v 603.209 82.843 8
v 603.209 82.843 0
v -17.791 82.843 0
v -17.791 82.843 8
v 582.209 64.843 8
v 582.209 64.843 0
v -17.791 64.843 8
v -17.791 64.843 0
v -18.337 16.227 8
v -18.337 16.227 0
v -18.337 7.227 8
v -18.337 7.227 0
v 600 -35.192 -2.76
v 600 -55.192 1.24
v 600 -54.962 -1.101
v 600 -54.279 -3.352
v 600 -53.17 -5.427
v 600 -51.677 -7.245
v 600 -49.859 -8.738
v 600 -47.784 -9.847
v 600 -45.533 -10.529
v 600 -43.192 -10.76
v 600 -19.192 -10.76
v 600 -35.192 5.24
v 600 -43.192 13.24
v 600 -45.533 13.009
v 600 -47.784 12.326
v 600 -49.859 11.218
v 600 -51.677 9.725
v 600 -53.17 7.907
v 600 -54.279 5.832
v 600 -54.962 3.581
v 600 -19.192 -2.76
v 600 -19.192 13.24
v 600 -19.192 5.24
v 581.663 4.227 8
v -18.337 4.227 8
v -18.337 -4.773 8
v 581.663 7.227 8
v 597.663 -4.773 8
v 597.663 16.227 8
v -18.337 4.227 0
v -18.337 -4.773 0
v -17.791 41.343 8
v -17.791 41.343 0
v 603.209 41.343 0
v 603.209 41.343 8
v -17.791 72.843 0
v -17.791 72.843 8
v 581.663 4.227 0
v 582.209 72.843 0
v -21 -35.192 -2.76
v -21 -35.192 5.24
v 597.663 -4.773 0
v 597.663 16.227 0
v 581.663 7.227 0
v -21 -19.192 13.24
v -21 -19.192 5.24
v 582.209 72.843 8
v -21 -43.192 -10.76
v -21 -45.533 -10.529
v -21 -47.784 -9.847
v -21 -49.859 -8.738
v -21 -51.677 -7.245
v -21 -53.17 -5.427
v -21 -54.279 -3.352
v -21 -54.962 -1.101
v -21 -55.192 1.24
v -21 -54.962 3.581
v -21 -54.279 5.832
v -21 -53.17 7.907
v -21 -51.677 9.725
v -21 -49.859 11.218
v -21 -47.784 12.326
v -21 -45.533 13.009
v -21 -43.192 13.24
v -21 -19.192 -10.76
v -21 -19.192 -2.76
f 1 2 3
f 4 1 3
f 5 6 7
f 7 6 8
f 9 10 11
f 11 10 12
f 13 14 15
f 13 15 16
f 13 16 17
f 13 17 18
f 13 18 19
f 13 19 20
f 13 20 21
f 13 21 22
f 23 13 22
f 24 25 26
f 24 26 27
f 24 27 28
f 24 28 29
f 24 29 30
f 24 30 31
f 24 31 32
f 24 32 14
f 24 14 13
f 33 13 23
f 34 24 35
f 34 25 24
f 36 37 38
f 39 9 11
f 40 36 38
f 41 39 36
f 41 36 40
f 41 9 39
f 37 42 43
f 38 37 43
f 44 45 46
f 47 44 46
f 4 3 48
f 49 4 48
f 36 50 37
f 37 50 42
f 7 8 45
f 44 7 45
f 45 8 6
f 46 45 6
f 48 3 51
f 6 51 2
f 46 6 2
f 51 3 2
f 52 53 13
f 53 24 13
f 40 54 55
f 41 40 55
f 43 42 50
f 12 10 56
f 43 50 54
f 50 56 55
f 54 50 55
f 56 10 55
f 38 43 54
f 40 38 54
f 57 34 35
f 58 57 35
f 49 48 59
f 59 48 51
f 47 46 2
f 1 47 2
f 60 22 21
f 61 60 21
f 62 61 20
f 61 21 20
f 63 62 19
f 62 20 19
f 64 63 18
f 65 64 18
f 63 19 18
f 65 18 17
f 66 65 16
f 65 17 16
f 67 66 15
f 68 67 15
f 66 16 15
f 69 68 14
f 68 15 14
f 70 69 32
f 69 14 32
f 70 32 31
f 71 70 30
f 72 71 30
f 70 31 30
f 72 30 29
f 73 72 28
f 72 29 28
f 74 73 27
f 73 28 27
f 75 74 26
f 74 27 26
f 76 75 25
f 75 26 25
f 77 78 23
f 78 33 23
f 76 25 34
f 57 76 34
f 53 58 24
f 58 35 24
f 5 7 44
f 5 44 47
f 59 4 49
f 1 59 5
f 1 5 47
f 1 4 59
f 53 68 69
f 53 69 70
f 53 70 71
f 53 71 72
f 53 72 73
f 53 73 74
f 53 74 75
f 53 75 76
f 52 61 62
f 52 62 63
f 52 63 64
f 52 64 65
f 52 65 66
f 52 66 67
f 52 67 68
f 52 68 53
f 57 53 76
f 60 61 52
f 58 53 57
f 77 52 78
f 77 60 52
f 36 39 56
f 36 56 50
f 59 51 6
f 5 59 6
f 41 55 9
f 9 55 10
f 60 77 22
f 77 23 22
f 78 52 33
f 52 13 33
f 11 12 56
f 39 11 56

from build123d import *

# Parameters (mm, degrees)
F2_DEPTH = 8
F3_DEPTH = 8
F5_DEPTH = 600
F6_DEPTH = 21


with BuildPart() as f2:
    # F0 (on Top) → F2 (new body)
    with BuildSketch(Plane.XY):
        Polygon((581.663213, 16.226503), (-18.336787, 16.226503), (-18.336787, 7.226503), (581.663213, 7.226503), (581.663213, 4.226503), (-18.336787, 4.226503), (-18.336787, -4.773497), (581.663213, -4.773497), (597.663213, -4.773497), (597.663213, 16.226503), align=None)
    extrude(amount=F2_DEPTH)


with BuildPart() as f3:
    # F1 (on Top) → F3 (new body)
    with BuildSketch(Plane.XY):
        Polygon((-17.790569, 64.843432), (-17.790569, 41.343432), (582.209431, 41.343432), (603.209431, 41.343432), (603.209431, 82.843432), (582.209431, 82.843432), (-17.790569, 82.843432), (-17.790569, 72.843432), (582.209431, 72.843432), (582.209431, 64.843432), align=None)
    extrude(amount=F3_DEPTH)


with BuildPart() as f5:
    # F4 (on Right) → F5 (new body)
    with BuildSketch(Plane.YZ):
        with BuildLine():
            Line((-19.1921, 5.23994), (-19.1921, 13.23994))
            Line((-19.1921, 13.23994), (-43.1921, 13.23994))
            ThreePointArc((-43.1921, 13.23994), (-55.1921, 1.23994), (-43.1921, -10.76006))
            Line((-43.1921, -10.76006), (-19.1921, -10.76006))
            Line((-19.1921, -10.76006), (-19.1921, -2.76006))
            Line((-19.1921, -2.76006), (-35.1921, -2.76006))
            Line((-35.1921, -2.76006), (-35.1921, 5.23994))
            Line((-35.1921, 5.23994), (-19.1921, 5.23994))
        make_face()
    extrude(amount=F5_DEPTH)

    # F5_face (on face) → F6 (join)
    with BuildSketch(Plane(origin=(0, -37.686272, 1.23994), x_dir=(0, 1, 0), z_dir=(-1, 0, 0))):
        with BuildLine():
            Line((18.494172, -12), (18.494172, -4))
            Line((18.494172, -4), (2.494172, -4))
            Line((2.494172, -4), (2.494172, 4))
            Line((2.494172, 4), (18.494172, 4))
            Line((18.494172, 4), (18.494172, 12))
            Line((18.494172, 12), (-5.505828, 12))
            ThreePointArc((-5.505828, 12), (-17.505828, 0), (-5.505828, -12))
            Line((-5.505828, -12), (18.494172, -12))
        make_face()
    extrude(amount=F6_DEPTH)


solid = Compound([f2.part, f3.part, f5.part])
